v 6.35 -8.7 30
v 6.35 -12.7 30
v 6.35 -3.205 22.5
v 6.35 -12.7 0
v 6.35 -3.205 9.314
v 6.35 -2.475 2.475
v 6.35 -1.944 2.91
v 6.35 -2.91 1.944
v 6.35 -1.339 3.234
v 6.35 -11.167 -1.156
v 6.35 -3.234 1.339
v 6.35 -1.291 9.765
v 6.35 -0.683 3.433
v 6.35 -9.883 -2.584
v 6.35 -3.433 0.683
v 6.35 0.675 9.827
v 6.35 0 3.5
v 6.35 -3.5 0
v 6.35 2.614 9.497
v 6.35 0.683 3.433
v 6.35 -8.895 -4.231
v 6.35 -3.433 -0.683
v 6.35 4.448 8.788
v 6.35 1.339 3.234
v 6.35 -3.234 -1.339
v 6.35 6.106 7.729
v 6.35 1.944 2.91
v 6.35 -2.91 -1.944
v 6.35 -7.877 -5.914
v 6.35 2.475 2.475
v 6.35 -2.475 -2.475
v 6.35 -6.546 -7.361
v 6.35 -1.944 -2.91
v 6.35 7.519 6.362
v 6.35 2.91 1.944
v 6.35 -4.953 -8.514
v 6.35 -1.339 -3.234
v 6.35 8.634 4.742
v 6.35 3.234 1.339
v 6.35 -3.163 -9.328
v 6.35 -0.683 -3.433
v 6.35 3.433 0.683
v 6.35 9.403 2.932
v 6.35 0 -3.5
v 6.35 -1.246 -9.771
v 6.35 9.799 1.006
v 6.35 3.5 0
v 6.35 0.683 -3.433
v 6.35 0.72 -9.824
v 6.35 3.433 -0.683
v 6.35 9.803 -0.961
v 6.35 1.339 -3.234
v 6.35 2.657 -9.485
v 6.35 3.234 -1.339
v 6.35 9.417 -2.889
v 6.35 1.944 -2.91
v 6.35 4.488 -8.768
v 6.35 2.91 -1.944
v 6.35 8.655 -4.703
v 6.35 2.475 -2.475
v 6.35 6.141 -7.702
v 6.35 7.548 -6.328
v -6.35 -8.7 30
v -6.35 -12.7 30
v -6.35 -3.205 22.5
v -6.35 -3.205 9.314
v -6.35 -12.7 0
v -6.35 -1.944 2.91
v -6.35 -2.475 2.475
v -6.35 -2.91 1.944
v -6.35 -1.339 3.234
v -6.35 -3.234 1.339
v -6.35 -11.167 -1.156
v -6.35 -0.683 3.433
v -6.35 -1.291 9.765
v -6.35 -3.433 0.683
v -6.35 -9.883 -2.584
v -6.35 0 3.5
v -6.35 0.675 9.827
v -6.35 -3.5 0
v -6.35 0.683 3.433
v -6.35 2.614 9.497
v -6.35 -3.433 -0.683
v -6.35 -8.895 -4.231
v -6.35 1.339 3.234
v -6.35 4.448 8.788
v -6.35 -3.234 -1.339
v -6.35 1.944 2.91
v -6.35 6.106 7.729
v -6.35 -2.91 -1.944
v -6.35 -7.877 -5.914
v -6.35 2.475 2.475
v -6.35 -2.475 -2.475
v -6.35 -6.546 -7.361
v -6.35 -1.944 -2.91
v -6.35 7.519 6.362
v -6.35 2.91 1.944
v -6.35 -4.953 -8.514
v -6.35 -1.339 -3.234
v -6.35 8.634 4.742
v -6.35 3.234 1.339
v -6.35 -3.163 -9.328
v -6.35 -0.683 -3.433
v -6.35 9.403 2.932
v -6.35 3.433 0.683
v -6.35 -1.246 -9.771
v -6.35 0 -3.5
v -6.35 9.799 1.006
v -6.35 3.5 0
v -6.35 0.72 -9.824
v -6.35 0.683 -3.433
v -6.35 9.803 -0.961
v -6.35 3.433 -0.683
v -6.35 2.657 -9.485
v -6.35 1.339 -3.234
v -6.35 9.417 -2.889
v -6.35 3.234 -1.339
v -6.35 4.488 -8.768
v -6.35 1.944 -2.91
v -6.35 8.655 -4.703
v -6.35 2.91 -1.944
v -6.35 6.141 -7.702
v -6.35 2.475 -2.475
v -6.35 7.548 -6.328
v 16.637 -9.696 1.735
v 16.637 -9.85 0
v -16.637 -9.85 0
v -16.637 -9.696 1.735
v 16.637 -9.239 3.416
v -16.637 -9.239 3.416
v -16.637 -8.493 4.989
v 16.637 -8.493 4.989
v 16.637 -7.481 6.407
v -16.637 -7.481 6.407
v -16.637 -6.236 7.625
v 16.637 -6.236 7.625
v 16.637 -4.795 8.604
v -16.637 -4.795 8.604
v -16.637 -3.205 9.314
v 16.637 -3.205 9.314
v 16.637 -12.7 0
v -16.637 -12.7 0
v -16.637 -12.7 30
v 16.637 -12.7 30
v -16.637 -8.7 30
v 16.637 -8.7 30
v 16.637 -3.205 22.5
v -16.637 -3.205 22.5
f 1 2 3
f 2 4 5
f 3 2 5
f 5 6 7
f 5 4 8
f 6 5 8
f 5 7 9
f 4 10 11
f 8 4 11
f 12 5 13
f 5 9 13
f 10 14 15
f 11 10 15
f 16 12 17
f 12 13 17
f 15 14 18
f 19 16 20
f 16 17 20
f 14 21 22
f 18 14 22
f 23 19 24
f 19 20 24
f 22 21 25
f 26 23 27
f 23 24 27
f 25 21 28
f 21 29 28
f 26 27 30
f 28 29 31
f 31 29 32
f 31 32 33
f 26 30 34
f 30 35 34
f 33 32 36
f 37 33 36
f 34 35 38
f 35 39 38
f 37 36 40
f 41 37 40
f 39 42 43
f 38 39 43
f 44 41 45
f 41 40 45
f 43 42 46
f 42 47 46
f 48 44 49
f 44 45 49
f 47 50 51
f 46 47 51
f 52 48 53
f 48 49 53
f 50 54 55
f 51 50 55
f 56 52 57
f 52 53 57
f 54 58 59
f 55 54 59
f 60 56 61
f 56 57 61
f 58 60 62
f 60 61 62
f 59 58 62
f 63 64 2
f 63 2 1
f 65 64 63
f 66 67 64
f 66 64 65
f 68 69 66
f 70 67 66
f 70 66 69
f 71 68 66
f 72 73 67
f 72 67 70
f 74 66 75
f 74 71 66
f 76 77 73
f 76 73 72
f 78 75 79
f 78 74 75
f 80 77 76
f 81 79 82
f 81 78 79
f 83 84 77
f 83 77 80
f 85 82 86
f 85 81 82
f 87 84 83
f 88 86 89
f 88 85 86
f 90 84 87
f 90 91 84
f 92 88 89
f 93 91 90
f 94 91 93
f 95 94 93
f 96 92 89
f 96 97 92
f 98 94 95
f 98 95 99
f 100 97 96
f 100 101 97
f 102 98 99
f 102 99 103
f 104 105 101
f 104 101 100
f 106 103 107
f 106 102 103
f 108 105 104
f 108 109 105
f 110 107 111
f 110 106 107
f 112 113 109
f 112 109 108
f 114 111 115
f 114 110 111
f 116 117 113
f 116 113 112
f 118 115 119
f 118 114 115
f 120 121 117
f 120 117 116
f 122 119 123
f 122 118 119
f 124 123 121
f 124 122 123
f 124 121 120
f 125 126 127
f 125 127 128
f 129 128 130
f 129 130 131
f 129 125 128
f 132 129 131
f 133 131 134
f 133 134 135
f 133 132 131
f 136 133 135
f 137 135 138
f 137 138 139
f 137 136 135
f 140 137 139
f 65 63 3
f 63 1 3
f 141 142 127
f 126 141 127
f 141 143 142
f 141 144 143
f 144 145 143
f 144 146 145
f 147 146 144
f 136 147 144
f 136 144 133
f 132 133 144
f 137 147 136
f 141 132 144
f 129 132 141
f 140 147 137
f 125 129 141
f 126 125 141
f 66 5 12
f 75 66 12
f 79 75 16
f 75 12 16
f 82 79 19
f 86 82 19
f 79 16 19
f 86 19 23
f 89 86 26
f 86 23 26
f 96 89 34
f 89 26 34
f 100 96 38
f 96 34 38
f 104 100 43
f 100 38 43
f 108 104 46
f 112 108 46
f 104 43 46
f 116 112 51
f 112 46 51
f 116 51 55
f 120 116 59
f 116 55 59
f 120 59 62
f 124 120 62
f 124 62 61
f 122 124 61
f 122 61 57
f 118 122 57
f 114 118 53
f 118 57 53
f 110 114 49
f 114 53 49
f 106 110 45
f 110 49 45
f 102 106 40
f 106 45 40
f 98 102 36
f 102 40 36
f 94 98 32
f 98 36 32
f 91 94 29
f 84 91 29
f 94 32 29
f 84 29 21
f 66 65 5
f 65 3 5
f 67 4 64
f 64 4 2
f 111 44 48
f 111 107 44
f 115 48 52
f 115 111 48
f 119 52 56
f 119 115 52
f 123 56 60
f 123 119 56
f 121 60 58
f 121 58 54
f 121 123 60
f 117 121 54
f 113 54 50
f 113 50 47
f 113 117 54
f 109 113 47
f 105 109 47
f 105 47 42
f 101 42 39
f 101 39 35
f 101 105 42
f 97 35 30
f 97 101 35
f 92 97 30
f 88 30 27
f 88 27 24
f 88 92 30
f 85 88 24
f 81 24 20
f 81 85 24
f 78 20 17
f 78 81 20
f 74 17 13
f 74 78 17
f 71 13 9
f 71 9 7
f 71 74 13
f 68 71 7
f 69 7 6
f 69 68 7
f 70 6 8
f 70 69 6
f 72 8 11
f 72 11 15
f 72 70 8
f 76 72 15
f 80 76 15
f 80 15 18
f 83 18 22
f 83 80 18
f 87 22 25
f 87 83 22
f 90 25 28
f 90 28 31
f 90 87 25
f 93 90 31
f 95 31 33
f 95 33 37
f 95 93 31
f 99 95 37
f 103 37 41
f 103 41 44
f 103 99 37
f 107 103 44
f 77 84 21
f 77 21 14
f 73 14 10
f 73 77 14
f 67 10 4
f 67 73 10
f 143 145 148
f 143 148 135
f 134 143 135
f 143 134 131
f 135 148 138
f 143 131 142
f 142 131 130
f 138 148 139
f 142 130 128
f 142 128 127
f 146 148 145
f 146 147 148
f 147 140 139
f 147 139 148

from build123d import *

# Parameters (mm, degrees)
SKETCH1_R           = 3.5
BOSS_EXTRUDE1_DEPTH = 6.35
BOSS_EXTRUDE2_DEPTH = 16.637
FILLET1_R           = 10


with BuildPart() as part:
    # Sketch1 → Boss-Extrude1 (new, symmetric)
    with BuildSketch(Plane(origin=(0, 0, 0), x_dir=(0, 0, -1), z_dir=(1, 0, 0))):
        with BuildLine():
            Line((0, -12.7), (-30, -12.7))
            Line((-30, -12.7), (-30, -8.7))
            Line((-30, -8.7), (-22.5, -3.204866216))
            Line((-22.5, -3.204866216), (-9.314039539, -3.204866216))
            ThreePointArc((-9.314039539, -3.204866216), (5.720776511, 8.018429779), (0, -9.85))
            Line((0, -9.85), (0, -12.7))
        make_face()
        Circle(SKETCH1_R, mode=Mode.SUBTRACT)
    extrude(amount=BOSS_EXTRUDE1_DEPTH, both=True)

    # Fillet1
    # the kernel refuses this fillet: 10 mm, written as the material it adds along each edge
    with BuildSketch(Plane(origin=(-6.35, -9.85, 0), x_dir=(0, -1, 0), z_dir=(1, 0, 0))) as fillet1_piece_1:
        with BuildLine():
            CenterArc((8.075688976, 8.525970603), FILLET1_R, 205.437097531, 33.058176113)
            Line((-0.954884815, 4.230771307), (-1.135496291, 4.144867321))
            ThreePointArc((-1.135496291, 4.144867321), (-0.436778957, 2.124563391), (-0.2, 0))
            Line((-0.2, 0), (0, -0.2))
            ThreePointArc((0, -0.2), (1.425, -0.2), (2.74548622, -0.170519412))
            Line((2.74548622, -0.170519412), (2.85, 0))
        make_face()
    extrude(amount=12.7)


with BuildPart() as body_2:
    # Sketch4 → Boss-Extrude2 (new, symmetric)
    with BuildSketch(Plane(origin=(0, 0, 0), x_dir=(0, 0, -1), z_dir=(1, 0, 0))):
        with BuildLine():
            Line((-30, -12.7), (0, -12.7))
            Line((0, -12.7), (0, -9.85))
            ThreePointArc((0, -9.85), (-5.720776511, -8.018429779), (-9.314039539, -3.204866216))
            Line((-9.314039539, -3.204866216), (-22.5, -3.204866216))
            Line((-22.5, -3.204866216), (-30, -8.7))
            Line((-30, -8.7), (-30, -12.7))
        make_face()
    extrude(amount=BOSS_EXTRUDE2_DEPTH, both=True)


solid = Compound([part.part, body_2.part])
